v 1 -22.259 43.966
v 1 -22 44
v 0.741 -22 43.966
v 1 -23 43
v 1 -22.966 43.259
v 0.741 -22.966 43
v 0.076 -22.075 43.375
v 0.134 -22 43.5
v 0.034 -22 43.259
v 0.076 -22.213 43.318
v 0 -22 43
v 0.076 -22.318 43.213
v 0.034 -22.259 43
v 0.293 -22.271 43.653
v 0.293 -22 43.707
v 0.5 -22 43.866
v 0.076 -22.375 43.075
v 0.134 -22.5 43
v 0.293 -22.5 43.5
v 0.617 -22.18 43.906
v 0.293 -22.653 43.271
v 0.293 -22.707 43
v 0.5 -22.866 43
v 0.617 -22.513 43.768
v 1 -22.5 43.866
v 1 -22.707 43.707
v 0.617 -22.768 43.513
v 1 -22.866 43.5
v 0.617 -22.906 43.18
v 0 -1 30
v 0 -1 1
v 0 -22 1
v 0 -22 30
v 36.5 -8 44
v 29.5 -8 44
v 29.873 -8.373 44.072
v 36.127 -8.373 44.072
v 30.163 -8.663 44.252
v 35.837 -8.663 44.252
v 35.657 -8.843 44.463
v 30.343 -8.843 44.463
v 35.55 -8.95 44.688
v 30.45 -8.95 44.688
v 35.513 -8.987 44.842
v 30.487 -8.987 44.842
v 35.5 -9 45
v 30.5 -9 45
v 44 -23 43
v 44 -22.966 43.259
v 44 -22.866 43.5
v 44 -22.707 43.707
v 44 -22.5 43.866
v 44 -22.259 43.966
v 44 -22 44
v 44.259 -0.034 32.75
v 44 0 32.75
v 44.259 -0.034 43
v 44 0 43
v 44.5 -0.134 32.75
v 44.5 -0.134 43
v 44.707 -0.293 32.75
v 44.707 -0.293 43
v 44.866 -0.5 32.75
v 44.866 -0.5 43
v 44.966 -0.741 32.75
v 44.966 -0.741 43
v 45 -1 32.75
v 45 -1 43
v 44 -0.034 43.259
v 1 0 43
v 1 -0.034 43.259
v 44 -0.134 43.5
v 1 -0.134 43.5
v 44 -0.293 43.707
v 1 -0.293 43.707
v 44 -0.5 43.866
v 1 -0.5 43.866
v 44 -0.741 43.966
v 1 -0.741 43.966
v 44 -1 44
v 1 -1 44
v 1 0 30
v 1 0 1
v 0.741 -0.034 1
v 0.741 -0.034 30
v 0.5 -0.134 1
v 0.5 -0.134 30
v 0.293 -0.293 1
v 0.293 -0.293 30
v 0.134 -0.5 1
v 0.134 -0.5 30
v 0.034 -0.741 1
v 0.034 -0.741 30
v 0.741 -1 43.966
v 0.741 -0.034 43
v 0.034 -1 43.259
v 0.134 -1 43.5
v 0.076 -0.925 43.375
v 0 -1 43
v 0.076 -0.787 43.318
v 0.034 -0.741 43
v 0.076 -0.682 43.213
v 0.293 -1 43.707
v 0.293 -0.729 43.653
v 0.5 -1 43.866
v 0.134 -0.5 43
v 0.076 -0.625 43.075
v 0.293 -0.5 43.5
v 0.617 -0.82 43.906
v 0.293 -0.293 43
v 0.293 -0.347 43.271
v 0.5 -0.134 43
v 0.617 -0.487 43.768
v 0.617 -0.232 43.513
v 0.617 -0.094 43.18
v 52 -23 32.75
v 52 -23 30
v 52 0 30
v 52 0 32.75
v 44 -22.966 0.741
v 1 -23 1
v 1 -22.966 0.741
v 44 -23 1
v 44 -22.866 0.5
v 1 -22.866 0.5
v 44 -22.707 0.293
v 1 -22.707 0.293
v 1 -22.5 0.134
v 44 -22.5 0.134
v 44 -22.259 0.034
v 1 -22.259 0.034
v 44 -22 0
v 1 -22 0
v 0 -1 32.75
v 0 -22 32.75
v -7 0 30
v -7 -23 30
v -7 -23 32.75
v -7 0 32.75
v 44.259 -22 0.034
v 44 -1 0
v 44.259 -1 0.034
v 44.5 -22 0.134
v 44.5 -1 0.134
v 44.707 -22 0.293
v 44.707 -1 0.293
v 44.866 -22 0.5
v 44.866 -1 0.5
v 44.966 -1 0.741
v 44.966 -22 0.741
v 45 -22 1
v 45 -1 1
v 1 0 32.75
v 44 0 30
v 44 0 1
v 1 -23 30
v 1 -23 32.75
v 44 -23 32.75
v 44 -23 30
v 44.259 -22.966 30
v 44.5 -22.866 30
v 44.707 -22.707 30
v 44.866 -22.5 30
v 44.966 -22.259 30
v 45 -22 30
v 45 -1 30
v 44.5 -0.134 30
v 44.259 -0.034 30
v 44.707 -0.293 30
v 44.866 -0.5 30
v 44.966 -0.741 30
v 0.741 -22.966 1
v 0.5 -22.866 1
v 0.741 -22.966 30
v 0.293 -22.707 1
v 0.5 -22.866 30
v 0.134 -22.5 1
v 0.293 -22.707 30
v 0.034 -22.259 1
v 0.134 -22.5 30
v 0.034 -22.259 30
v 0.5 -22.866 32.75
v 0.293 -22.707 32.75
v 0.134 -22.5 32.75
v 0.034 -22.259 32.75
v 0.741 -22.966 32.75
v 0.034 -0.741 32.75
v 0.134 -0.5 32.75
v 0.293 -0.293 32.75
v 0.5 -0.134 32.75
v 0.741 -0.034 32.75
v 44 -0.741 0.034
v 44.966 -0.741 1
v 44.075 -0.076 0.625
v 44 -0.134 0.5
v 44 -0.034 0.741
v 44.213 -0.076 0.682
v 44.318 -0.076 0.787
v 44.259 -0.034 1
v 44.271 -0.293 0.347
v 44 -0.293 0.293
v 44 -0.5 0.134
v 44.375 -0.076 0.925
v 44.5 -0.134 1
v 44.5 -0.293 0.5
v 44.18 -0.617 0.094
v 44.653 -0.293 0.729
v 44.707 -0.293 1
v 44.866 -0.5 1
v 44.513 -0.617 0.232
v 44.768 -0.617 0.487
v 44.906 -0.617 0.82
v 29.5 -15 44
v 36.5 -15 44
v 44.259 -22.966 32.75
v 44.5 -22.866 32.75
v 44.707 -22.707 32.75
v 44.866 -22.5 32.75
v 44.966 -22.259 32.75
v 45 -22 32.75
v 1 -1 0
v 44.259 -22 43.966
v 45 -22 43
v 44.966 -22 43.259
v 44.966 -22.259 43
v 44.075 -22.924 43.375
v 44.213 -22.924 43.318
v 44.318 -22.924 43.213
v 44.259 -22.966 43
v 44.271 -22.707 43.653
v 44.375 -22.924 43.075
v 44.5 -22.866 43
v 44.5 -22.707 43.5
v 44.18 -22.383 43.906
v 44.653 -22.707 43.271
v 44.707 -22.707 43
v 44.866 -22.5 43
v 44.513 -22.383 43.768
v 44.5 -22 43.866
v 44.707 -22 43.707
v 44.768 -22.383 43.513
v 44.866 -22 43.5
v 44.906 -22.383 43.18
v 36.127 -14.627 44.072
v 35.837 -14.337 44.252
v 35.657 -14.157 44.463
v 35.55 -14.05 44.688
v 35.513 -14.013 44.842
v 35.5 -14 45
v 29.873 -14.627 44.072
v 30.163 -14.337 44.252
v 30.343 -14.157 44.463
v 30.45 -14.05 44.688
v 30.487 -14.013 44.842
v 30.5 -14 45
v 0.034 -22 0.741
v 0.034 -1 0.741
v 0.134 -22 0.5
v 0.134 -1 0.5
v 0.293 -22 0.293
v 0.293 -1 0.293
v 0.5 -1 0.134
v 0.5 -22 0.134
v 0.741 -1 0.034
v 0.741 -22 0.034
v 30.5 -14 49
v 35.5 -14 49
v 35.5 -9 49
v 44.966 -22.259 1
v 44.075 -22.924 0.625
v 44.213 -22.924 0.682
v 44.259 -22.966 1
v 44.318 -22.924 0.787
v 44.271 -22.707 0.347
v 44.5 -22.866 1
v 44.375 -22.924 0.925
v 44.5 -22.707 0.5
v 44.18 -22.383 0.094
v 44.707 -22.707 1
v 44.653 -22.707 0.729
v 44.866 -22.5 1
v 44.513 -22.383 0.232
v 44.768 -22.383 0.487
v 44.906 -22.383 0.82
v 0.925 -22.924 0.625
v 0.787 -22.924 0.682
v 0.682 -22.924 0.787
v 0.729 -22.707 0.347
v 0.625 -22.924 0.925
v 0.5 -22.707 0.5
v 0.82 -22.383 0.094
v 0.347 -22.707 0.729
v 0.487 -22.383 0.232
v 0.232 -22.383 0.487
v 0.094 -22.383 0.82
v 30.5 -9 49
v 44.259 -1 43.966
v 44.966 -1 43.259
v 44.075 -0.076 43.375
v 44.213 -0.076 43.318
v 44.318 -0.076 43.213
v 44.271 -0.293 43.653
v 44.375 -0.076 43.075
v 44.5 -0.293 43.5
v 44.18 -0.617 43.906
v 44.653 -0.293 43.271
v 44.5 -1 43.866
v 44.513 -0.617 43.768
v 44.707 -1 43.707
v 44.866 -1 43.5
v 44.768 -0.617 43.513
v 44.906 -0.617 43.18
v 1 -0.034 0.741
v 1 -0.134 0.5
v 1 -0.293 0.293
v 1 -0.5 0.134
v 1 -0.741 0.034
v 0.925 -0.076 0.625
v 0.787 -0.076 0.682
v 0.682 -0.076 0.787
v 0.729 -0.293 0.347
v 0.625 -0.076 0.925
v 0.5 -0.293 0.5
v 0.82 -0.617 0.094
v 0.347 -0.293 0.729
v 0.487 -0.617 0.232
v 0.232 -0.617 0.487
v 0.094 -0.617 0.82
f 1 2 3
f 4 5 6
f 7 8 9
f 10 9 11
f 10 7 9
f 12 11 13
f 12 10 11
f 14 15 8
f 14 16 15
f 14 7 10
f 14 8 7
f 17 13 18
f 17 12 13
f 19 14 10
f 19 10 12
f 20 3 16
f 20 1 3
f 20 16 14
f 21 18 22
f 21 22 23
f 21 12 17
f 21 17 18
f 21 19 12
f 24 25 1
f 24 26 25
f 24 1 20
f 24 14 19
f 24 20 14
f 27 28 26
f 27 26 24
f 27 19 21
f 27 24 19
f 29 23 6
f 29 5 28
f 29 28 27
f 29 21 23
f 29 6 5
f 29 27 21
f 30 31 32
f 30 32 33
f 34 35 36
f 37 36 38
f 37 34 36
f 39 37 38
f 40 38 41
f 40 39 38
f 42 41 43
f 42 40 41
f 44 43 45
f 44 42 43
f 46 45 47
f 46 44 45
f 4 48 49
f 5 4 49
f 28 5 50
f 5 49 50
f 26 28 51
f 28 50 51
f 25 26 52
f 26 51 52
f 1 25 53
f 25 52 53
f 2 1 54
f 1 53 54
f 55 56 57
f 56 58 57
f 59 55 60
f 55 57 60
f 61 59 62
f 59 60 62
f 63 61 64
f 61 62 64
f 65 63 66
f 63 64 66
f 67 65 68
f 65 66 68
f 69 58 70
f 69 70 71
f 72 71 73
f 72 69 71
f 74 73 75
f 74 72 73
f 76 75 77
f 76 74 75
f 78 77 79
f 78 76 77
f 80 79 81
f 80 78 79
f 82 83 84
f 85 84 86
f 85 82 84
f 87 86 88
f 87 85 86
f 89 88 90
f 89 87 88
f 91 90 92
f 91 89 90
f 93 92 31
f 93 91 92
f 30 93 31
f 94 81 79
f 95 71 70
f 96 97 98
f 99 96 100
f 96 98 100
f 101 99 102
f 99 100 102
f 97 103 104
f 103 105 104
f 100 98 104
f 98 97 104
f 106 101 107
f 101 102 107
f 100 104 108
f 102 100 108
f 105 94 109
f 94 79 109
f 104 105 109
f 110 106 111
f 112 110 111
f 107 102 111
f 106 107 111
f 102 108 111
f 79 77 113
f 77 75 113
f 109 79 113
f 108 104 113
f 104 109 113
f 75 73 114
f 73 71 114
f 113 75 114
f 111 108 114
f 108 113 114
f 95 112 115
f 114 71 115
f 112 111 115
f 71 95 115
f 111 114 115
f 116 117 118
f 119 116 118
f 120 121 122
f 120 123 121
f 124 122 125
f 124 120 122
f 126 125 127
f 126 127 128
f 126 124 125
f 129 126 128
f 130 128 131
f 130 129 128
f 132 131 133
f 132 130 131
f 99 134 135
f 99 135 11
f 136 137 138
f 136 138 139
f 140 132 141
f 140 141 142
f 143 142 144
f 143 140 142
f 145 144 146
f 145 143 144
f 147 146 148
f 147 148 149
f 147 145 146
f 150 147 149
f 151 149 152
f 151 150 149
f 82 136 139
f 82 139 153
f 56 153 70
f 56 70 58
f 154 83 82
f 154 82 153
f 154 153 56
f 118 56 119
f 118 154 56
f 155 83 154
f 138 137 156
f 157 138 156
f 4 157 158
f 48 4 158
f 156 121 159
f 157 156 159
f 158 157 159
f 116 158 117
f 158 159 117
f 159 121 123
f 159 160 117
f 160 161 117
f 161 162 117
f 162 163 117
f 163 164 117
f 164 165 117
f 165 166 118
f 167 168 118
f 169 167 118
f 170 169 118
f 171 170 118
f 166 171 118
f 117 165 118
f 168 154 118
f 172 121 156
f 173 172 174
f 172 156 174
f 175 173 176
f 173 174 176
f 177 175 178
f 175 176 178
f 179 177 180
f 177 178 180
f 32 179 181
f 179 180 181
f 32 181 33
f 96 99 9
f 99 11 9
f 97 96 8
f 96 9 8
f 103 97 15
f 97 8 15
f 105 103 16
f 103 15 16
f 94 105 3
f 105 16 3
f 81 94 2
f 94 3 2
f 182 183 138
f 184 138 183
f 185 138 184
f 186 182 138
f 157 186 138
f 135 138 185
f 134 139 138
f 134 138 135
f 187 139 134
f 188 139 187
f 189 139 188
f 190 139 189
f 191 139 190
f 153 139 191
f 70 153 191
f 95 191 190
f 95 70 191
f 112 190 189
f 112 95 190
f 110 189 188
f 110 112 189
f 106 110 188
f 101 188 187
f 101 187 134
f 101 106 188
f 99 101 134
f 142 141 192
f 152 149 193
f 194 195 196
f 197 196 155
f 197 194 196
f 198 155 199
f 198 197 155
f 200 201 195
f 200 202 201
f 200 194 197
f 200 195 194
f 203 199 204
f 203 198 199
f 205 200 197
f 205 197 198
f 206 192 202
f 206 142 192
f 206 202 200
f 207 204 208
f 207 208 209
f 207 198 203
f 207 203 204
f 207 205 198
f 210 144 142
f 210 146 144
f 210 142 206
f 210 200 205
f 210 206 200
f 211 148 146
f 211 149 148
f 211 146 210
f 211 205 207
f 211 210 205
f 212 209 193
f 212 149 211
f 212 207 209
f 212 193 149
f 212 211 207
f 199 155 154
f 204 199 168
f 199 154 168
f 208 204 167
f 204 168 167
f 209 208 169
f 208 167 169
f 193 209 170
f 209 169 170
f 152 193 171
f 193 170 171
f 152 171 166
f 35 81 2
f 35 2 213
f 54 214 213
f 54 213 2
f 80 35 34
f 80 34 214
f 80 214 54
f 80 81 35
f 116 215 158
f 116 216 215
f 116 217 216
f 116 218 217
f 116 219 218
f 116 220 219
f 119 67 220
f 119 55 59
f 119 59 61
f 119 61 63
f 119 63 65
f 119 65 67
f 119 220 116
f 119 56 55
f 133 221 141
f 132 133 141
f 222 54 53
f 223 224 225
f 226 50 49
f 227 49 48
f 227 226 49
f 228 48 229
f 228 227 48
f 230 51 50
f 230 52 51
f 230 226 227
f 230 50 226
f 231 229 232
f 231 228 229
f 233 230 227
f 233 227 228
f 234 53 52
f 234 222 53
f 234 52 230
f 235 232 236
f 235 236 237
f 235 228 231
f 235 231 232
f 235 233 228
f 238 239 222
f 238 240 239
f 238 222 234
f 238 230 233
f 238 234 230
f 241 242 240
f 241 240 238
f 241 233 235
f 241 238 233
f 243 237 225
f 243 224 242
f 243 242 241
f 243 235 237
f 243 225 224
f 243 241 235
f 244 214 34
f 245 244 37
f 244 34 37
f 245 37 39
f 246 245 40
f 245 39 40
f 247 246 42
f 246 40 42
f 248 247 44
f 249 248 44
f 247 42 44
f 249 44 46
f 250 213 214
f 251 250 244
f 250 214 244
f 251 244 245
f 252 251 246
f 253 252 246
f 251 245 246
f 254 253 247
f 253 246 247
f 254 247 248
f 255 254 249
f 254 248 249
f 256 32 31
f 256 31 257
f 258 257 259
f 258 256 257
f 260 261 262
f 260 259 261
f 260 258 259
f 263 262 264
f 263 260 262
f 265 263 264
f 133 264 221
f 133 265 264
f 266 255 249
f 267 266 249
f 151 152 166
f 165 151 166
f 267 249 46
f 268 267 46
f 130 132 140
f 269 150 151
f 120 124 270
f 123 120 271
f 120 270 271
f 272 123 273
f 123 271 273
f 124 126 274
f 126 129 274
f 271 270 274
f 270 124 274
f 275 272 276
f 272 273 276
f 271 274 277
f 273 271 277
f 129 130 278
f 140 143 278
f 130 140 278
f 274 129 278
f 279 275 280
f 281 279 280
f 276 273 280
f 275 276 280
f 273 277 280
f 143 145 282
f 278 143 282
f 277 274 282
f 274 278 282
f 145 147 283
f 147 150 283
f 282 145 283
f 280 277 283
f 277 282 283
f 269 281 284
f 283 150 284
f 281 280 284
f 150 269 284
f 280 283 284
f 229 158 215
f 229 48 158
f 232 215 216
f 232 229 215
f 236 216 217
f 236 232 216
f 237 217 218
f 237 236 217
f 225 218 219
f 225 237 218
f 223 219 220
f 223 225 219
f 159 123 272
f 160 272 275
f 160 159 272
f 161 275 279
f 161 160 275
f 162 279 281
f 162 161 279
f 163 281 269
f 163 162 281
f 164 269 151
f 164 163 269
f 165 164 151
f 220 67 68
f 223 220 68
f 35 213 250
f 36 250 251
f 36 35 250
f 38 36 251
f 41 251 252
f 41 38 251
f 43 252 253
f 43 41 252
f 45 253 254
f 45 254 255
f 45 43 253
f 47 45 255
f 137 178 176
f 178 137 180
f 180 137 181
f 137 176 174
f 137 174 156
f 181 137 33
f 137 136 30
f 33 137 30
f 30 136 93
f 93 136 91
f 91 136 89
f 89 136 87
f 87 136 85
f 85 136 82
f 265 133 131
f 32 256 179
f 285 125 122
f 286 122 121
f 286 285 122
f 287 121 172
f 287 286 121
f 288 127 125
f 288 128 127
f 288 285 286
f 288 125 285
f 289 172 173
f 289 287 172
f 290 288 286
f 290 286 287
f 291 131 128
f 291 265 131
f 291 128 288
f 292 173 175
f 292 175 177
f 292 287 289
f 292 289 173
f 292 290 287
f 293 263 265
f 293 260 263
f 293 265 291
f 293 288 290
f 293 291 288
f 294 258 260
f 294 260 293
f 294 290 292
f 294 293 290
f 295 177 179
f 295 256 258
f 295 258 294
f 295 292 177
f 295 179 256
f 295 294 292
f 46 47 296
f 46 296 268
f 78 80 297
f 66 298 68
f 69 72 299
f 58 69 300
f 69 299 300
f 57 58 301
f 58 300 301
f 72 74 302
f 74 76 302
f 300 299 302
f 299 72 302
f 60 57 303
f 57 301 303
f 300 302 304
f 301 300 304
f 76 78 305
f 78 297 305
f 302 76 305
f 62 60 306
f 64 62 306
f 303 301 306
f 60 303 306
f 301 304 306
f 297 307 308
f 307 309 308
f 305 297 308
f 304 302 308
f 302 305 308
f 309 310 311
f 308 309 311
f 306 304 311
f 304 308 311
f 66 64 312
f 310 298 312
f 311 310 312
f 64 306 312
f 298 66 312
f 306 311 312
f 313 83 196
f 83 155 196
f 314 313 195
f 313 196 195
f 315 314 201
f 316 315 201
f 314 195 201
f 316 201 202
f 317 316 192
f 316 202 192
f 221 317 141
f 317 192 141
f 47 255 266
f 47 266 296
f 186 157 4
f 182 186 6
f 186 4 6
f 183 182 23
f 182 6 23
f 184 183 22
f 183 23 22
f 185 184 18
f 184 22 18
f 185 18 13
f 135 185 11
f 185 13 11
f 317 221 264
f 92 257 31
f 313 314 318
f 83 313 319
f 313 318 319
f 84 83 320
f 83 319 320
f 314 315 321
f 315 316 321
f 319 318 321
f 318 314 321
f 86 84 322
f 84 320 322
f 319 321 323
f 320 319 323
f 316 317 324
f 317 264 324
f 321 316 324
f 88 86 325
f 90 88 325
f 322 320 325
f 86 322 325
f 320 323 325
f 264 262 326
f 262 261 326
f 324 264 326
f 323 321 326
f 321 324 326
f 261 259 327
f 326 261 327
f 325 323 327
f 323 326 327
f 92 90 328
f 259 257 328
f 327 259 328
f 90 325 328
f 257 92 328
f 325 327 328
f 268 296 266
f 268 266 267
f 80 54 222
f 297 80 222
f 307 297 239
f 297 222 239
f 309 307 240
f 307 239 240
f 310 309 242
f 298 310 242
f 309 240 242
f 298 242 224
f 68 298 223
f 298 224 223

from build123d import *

# Parameters (mm, degrees)
F0_W     = 45
F0_H     = 44
F1_DEPTH = 23
F2_W     = 5
F2_H     = 5
F3_DEPTH = 5
F5_W     = 59
F5_H     = 23
F6_DEPTH = 2.75
F7_R     = 1


with BuildPart() as f1:
    # F0 (on Front) → F1 (new body)
    with BuildSketch(Plane.XZ):
        with Locations((22.5, 22)):
            Rectangle(F0_W, F0_H)
    extrude(amount=F1_DEPTH)

    # F2 (on face) → F3 (join)
    with BuildSketch(Plane.XY.offset(44)):
        with Locations((33, -11.5)):
            Rectangle(F2_W, F2_H)
    extrude(amount=F3_DEPTH)

    # F5 (on offset) → F6 (join)
    with BuildSketch(Plane.XY.offset(30)):
        with Locations((22.5, -11.5)):
            Rectangle(F5_W, F5_H)
    extrude(amount=F6_DEPTH)

    # F7
    f7_edges = [f1.edges().sort_by_distance(p)[0] for p in [
        (45, -11.5, 44),
        (22.5, 0, 44),
        (22.5, -23, 44),
        (0, -11.5, 44),
        (33, -9, 44),
        (35.5, -11.5, 44),
        (33, -14, 44),
        (30.5, -11.5, 44),
        (0, -11.5, 0),
        (45, -11.5, 0),
        (22.5, 0, 0),
        (22.5, -23, 0),
        (45, -23, 15),
        (45, 0, 15),
        (0, -23, 15),
        (0, -23, 38.375),
        (45, -23, 38.375),
        (45, 0, 38.375),
        (0, 0, 38.375),
        (0, 0, 15),
    ]]
    fillet(f7_edges, radius=F7_R)


solid = f1.part
